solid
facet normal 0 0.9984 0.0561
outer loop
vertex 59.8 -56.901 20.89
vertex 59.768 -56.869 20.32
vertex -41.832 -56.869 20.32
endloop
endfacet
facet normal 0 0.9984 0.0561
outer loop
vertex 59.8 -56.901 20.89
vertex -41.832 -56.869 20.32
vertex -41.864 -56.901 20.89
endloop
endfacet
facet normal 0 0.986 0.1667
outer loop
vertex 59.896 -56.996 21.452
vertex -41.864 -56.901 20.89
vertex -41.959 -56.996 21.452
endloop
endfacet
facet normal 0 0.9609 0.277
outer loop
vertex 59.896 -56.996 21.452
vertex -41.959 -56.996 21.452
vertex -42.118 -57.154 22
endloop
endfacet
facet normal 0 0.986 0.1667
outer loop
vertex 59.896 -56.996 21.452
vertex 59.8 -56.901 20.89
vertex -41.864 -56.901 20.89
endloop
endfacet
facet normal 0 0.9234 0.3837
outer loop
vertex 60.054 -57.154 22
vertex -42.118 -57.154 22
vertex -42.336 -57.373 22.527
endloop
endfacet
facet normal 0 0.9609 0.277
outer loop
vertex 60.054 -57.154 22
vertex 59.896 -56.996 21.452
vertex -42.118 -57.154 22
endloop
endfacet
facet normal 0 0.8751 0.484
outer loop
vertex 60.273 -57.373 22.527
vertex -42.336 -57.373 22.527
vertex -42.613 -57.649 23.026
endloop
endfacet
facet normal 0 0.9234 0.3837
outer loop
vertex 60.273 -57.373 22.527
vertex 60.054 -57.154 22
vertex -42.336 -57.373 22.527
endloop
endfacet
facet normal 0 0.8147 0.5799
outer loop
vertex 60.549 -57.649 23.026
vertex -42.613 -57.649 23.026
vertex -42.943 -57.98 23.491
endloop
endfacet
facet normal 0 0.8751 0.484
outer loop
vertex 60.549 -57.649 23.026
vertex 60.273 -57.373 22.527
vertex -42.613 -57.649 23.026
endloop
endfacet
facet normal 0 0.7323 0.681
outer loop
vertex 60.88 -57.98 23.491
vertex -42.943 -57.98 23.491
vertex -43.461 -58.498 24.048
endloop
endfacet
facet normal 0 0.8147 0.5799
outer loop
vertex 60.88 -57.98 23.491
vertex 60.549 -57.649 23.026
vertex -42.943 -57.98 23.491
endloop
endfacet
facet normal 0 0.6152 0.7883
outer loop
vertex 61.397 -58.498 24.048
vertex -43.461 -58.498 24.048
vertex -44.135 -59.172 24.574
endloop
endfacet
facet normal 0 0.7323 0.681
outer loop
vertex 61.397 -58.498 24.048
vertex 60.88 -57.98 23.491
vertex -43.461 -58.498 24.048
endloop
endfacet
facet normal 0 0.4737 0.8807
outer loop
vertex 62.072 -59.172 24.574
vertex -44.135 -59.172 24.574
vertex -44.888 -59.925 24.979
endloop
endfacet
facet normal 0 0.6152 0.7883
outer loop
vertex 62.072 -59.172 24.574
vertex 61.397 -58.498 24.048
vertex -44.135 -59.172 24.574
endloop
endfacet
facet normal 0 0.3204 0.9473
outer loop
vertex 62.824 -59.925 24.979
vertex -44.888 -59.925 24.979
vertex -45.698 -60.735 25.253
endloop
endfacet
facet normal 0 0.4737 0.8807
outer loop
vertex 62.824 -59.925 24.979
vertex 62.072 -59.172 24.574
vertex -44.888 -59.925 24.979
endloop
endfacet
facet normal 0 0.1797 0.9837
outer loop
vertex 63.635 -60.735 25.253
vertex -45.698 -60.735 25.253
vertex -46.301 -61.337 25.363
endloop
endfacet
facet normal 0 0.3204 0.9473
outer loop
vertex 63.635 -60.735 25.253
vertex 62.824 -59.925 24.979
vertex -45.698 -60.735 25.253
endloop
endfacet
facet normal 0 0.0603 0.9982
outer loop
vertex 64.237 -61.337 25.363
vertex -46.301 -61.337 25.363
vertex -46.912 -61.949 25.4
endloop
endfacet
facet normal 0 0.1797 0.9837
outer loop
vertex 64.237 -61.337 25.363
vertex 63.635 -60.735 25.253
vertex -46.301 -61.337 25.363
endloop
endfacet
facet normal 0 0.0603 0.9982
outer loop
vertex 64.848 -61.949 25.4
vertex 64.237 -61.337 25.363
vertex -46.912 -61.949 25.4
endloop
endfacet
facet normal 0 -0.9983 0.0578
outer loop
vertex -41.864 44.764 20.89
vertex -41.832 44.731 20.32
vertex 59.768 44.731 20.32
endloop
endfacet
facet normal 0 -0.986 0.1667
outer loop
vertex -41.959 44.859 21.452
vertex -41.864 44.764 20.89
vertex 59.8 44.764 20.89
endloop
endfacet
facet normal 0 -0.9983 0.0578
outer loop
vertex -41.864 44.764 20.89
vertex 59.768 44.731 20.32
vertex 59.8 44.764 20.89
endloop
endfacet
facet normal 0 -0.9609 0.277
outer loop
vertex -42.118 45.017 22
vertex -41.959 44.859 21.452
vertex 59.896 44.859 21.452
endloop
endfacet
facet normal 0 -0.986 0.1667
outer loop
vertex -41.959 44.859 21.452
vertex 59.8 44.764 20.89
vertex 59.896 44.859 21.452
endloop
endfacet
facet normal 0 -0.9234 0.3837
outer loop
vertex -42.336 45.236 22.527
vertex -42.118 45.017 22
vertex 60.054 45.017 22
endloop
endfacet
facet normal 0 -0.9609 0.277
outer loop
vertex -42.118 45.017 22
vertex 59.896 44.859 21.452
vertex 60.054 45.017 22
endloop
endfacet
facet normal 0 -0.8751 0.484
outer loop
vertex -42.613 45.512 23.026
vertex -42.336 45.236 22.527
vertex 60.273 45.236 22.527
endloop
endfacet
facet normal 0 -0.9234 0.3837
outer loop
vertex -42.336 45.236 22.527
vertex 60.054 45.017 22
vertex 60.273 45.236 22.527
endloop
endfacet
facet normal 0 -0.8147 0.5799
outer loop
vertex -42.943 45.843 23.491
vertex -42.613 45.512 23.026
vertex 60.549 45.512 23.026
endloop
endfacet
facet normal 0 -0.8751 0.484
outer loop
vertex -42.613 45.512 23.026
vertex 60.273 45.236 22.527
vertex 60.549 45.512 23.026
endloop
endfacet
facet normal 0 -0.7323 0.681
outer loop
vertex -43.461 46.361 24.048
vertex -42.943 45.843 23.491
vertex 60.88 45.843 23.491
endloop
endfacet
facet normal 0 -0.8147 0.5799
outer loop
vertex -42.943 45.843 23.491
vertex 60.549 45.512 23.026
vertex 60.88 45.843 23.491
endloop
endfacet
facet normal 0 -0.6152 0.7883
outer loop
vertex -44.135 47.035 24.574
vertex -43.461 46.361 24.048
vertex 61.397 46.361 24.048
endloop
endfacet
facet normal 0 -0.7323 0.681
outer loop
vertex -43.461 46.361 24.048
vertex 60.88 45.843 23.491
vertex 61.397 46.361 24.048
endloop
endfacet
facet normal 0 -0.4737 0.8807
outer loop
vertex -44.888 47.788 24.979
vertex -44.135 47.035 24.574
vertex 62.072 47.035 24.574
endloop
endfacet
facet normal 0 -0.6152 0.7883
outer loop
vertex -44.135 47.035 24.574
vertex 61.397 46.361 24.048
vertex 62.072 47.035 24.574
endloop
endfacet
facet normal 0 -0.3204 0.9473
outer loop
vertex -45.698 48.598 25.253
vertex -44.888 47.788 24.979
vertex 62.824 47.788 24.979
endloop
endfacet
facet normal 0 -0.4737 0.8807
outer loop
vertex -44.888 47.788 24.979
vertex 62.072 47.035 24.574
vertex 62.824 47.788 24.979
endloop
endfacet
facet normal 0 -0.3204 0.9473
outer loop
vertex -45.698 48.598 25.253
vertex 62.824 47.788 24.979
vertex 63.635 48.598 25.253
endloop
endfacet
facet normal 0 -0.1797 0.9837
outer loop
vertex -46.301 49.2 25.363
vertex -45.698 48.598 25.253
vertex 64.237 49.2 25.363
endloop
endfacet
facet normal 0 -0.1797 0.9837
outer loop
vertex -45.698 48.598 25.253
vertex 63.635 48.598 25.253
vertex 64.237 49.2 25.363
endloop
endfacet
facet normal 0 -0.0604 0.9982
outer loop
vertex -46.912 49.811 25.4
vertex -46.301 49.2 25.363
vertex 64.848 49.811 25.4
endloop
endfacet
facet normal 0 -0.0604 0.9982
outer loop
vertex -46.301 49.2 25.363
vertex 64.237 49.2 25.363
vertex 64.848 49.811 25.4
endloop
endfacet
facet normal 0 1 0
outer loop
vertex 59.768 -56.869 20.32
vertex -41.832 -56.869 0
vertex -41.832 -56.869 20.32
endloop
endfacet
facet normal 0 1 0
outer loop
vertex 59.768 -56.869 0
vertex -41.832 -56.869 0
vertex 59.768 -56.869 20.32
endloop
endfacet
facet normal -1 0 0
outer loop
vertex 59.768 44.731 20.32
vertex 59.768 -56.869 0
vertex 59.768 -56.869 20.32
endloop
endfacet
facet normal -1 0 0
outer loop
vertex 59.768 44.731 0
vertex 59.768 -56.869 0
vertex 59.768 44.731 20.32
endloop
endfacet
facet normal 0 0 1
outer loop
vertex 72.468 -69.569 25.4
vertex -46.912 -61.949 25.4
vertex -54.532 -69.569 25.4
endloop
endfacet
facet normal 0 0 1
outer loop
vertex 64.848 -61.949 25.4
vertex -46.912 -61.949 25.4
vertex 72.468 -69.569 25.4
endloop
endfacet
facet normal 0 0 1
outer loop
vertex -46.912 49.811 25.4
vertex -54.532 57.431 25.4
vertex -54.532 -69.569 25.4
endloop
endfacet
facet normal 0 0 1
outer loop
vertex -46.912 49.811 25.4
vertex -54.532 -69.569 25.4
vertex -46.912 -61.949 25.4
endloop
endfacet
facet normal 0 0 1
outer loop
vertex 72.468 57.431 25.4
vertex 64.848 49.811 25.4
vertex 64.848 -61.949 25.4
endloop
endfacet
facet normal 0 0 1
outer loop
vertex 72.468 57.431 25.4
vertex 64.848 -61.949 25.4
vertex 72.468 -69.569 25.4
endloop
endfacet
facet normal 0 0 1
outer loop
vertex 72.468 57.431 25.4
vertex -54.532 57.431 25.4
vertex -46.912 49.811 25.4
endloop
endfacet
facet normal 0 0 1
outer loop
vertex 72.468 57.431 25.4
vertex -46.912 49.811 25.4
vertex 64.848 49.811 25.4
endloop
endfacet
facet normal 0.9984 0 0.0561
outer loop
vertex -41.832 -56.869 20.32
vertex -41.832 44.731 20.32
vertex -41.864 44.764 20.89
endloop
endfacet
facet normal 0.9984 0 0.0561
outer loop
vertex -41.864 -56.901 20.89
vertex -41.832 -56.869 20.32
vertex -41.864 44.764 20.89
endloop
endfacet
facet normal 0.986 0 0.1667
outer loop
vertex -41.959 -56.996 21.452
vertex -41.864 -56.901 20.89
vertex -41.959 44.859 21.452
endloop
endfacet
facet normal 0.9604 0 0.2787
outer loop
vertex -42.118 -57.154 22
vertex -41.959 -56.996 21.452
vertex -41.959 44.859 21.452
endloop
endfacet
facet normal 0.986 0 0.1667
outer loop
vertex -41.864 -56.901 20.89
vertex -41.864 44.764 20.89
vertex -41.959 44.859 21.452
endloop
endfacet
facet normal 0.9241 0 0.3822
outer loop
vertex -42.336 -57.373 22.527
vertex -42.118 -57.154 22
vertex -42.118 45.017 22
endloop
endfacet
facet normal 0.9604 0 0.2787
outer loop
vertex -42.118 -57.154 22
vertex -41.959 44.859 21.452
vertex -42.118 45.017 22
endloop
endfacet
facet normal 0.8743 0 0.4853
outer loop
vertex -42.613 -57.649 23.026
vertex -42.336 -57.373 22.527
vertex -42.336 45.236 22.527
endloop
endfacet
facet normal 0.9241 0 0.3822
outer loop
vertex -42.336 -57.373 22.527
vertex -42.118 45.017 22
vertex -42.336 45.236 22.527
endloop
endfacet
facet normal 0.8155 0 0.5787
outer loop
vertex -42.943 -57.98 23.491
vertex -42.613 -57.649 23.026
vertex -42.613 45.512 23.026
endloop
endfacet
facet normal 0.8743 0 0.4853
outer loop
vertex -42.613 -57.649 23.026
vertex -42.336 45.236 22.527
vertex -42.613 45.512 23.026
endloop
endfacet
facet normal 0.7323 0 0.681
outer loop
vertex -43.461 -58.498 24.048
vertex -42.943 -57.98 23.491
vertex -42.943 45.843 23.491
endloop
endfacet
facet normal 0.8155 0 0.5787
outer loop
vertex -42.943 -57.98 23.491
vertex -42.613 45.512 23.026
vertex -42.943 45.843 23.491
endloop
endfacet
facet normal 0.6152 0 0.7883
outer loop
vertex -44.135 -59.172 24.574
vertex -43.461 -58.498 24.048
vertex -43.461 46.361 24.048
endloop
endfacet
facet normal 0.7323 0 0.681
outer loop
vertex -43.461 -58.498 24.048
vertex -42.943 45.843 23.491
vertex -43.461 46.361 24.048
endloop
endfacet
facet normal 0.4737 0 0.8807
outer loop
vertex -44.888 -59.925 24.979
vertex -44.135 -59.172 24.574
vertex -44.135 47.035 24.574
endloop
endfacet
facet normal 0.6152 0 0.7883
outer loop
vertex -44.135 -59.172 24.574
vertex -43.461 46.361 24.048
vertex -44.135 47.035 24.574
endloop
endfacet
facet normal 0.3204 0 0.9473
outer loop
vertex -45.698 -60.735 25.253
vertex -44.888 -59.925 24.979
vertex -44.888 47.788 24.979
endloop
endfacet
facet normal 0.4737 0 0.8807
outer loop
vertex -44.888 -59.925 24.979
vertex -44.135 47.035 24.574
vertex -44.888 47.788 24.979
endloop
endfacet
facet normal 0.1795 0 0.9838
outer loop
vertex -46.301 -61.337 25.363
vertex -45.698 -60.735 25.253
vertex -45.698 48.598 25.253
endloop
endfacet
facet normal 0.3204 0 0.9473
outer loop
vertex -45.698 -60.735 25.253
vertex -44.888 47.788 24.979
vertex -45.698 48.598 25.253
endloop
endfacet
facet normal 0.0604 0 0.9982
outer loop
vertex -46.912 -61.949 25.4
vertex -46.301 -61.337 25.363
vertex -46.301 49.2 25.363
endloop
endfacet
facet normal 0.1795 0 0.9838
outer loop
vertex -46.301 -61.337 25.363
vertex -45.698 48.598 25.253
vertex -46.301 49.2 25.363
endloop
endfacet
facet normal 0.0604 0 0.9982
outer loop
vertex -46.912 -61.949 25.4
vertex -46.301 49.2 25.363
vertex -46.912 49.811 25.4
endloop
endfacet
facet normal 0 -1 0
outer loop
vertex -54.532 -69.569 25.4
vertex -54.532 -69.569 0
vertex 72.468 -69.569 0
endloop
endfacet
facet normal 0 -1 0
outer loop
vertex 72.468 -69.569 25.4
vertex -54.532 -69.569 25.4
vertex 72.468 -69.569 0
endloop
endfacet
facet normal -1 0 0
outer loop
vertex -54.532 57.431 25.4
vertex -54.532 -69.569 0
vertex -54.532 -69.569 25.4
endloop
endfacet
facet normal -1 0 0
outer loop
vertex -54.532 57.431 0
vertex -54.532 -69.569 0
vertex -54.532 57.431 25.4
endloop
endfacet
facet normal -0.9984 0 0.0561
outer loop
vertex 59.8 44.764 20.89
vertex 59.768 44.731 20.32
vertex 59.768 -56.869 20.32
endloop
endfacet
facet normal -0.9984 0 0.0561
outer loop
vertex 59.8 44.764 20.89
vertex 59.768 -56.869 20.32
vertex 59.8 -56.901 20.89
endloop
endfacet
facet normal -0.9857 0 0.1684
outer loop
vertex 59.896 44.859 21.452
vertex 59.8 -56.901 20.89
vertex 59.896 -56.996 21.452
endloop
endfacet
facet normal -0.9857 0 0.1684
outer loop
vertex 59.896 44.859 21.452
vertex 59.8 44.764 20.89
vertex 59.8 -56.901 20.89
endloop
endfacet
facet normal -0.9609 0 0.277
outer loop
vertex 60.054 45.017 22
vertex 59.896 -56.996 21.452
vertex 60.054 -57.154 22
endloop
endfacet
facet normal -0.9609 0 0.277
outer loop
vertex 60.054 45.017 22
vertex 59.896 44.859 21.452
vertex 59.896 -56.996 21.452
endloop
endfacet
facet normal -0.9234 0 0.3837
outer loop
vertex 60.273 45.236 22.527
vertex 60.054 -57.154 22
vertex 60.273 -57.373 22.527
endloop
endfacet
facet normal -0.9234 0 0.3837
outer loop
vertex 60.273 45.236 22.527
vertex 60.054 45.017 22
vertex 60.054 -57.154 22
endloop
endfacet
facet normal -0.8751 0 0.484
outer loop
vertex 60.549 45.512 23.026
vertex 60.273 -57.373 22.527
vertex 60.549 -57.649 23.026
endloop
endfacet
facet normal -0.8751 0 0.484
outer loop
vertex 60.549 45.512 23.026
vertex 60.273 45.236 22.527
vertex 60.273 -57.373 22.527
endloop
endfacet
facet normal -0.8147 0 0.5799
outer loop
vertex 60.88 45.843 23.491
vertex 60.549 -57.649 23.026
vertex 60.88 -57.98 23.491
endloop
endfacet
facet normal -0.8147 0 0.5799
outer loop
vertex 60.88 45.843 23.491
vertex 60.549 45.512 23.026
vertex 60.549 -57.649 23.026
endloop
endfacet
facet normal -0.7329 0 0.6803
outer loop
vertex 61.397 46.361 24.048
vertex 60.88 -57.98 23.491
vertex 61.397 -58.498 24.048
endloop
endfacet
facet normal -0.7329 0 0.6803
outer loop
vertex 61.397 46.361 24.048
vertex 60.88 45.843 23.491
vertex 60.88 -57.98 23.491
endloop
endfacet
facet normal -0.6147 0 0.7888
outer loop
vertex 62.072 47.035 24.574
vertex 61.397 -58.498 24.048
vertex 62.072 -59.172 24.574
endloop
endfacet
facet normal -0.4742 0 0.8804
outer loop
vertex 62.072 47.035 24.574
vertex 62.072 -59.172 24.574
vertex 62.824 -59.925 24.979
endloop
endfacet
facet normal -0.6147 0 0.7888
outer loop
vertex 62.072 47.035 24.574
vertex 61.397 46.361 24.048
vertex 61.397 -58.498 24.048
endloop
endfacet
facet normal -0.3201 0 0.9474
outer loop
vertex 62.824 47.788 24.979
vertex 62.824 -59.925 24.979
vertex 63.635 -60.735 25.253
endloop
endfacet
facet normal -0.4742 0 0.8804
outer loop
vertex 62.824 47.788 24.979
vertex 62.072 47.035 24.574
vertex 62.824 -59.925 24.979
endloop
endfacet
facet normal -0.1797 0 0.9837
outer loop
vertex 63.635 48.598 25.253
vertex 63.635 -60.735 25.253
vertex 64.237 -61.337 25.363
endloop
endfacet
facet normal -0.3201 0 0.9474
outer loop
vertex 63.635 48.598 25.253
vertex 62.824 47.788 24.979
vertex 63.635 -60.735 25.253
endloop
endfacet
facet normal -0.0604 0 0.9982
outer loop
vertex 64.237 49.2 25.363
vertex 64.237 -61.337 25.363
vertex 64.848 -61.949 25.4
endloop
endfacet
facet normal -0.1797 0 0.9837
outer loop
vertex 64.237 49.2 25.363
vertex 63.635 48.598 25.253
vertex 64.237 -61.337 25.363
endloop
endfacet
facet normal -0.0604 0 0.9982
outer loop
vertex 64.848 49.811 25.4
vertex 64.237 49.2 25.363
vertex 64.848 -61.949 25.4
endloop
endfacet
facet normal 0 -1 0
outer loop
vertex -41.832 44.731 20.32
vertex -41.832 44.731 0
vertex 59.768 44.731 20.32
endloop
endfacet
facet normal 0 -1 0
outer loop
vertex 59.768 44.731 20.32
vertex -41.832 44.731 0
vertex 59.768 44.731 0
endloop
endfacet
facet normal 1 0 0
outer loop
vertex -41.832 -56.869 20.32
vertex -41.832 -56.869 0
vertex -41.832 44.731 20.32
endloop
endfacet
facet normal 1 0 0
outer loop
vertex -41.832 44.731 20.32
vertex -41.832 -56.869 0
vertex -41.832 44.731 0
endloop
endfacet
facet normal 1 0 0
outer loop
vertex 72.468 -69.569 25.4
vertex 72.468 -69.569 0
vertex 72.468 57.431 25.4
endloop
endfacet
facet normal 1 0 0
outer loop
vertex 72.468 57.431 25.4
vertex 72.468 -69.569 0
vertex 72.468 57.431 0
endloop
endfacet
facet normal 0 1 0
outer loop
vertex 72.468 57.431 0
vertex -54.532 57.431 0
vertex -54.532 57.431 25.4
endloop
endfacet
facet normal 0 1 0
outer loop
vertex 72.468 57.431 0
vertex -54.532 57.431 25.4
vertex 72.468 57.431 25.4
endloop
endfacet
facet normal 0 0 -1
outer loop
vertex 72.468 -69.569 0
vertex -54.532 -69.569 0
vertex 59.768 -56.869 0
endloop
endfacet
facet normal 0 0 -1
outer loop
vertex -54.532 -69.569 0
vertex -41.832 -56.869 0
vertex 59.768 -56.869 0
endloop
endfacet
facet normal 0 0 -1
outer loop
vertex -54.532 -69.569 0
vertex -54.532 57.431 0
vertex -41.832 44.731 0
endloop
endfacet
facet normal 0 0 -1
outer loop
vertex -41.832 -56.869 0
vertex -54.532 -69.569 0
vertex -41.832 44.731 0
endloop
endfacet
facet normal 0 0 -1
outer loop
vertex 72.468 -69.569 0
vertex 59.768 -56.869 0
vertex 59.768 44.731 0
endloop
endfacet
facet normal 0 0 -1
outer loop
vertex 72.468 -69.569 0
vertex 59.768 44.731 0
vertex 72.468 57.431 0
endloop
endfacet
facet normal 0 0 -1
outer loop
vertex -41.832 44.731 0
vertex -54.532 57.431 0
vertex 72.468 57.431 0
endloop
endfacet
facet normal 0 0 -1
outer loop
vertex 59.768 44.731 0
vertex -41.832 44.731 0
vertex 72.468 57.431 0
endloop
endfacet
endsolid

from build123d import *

# Parameters (mm, degrees)
F1_W     = 127
F1_H     = 127
F1_W_2   = 101.6
F1_H_2   = 101.6
F2_DEPTH = 25.4
F3_R     = 5.08


with BuildPart() as f2:
    # F1 (on face) → F2 (new body)
    with BuildSketch(Plane.XY):
        with Locations((8.968271, -6.068526)):
            Rectangle(F1_W, F1_H)
        with Locations((8.968271, -6.068526)):
            Rectangle(F1_W_2, F1_H_2, mode=Mode.SUBTRACT)
    extrude(amount=F2_DEPTH)

    # F3
    f3_edges = [f2.edges().sort_by_distance(p)[0] for p in [
        (8.968271, -56.868526, 25.4),
        (59.768271, -6.068526, 25.4),
        (-41.831729, -6.068526, 25.4),
        (8.968271, 44.731474, 25.4),
    ]]
    fillet(f3_edges, radius=F3_R)


solid = f2.part
